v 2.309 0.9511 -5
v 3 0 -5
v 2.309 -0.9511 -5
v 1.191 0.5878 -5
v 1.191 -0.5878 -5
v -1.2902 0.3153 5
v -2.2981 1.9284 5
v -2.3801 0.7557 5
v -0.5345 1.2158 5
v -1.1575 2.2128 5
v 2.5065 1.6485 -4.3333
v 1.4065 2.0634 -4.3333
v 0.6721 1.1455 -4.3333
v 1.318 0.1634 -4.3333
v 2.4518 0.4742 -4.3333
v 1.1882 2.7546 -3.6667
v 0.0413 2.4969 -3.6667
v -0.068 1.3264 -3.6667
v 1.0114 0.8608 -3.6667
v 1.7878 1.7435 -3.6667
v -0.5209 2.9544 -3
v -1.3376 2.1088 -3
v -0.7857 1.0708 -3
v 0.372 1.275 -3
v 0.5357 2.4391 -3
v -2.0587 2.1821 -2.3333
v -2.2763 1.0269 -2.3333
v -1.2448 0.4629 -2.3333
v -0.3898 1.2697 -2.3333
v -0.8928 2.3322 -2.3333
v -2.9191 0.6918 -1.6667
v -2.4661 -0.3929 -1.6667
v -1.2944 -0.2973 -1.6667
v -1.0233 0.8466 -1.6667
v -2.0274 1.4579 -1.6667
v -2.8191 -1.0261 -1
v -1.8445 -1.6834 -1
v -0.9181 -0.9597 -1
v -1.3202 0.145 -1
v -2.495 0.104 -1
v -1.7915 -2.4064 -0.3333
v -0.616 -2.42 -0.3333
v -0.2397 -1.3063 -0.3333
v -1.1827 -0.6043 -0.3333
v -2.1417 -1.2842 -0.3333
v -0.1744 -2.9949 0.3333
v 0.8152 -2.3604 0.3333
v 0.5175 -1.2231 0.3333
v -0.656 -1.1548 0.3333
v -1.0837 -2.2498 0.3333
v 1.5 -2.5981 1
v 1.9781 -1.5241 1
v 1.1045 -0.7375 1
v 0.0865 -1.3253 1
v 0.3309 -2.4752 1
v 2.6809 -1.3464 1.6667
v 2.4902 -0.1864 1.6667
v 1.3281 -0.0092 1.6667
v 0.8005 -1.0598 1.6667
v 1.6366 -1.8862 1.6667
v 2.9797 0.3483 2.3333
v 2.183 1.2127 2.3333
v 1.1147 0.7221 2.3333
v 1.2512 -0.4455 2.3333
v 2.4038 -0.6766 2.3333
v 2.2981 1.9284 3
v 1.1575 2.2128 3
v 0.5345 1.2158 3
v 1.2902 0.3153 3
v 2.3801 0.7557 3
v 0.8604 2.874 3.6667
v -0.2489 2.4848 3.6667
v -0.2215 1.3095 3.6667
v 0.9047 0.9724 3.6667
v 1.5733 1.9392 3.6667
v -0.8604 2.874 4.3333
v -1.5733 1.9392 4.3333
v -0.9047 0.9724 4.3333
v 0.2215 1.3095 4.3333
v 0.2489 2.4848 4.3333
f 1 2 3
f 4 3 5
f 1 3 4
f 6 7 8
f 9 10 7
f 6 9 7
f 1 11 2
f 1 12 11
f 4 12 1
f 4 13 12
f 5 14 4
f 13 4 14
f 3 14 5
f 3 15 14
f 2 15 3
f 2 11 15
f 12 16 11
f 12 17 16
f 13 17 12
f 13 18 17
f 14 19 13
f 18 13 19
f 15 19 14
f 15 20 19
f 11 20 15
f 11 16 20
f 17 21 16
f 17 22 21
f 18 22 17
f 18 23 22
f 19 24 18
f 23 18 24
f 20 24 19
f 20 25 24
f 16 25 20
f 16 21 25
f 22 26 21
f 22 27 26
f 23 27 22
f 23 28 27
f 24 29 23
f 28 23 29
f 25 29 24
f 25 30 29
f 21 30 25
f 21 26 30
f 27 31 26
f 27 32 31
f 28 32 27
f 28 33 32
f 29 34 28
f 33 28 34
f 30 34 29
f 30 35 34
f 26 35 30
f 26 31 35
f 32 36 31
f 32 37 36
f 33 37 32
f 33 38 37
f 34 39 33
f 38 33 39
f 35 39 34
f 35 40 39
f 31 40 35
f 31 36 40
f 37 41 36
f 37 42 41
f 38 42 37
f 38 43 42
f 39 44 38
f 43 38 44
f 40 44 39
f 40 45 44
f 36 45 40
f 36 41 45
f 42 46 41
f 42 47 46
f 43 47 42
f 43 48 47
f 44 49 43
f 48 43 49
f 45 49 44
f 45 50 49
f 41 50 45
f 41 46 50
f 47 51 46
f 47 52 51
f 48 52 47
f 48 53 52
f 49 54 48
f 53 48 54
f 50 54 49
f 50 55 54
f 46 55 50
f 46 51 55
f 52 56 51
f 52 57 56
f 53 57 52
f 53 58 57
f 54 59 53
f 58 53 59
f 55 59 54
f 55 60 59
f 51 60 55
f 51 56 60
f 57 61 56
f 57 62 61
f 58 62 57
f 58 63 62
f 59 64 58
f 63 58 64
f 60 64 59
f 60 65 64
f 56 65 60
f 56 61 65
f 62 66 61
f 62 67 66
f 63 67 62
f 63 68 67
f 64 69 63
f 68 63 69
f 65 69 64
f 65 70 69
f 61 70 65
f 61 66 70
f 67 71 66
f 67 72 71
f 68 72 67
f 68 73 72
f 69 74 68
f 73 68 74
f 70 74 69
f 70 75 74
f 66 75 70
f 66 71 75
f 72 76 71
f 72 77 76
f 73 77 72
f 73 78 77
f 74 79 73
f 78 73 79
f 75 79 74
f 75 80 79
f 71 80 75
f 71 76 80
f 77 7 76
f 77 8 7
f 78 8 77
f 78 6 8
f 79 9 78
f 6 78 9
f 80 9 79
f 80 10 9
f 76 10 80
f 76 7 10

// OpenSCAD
linear_extrude(height = 10, center = true, convexity = 10, twist = -500)
translate([2, 0, 0])
circle(r = 1);
